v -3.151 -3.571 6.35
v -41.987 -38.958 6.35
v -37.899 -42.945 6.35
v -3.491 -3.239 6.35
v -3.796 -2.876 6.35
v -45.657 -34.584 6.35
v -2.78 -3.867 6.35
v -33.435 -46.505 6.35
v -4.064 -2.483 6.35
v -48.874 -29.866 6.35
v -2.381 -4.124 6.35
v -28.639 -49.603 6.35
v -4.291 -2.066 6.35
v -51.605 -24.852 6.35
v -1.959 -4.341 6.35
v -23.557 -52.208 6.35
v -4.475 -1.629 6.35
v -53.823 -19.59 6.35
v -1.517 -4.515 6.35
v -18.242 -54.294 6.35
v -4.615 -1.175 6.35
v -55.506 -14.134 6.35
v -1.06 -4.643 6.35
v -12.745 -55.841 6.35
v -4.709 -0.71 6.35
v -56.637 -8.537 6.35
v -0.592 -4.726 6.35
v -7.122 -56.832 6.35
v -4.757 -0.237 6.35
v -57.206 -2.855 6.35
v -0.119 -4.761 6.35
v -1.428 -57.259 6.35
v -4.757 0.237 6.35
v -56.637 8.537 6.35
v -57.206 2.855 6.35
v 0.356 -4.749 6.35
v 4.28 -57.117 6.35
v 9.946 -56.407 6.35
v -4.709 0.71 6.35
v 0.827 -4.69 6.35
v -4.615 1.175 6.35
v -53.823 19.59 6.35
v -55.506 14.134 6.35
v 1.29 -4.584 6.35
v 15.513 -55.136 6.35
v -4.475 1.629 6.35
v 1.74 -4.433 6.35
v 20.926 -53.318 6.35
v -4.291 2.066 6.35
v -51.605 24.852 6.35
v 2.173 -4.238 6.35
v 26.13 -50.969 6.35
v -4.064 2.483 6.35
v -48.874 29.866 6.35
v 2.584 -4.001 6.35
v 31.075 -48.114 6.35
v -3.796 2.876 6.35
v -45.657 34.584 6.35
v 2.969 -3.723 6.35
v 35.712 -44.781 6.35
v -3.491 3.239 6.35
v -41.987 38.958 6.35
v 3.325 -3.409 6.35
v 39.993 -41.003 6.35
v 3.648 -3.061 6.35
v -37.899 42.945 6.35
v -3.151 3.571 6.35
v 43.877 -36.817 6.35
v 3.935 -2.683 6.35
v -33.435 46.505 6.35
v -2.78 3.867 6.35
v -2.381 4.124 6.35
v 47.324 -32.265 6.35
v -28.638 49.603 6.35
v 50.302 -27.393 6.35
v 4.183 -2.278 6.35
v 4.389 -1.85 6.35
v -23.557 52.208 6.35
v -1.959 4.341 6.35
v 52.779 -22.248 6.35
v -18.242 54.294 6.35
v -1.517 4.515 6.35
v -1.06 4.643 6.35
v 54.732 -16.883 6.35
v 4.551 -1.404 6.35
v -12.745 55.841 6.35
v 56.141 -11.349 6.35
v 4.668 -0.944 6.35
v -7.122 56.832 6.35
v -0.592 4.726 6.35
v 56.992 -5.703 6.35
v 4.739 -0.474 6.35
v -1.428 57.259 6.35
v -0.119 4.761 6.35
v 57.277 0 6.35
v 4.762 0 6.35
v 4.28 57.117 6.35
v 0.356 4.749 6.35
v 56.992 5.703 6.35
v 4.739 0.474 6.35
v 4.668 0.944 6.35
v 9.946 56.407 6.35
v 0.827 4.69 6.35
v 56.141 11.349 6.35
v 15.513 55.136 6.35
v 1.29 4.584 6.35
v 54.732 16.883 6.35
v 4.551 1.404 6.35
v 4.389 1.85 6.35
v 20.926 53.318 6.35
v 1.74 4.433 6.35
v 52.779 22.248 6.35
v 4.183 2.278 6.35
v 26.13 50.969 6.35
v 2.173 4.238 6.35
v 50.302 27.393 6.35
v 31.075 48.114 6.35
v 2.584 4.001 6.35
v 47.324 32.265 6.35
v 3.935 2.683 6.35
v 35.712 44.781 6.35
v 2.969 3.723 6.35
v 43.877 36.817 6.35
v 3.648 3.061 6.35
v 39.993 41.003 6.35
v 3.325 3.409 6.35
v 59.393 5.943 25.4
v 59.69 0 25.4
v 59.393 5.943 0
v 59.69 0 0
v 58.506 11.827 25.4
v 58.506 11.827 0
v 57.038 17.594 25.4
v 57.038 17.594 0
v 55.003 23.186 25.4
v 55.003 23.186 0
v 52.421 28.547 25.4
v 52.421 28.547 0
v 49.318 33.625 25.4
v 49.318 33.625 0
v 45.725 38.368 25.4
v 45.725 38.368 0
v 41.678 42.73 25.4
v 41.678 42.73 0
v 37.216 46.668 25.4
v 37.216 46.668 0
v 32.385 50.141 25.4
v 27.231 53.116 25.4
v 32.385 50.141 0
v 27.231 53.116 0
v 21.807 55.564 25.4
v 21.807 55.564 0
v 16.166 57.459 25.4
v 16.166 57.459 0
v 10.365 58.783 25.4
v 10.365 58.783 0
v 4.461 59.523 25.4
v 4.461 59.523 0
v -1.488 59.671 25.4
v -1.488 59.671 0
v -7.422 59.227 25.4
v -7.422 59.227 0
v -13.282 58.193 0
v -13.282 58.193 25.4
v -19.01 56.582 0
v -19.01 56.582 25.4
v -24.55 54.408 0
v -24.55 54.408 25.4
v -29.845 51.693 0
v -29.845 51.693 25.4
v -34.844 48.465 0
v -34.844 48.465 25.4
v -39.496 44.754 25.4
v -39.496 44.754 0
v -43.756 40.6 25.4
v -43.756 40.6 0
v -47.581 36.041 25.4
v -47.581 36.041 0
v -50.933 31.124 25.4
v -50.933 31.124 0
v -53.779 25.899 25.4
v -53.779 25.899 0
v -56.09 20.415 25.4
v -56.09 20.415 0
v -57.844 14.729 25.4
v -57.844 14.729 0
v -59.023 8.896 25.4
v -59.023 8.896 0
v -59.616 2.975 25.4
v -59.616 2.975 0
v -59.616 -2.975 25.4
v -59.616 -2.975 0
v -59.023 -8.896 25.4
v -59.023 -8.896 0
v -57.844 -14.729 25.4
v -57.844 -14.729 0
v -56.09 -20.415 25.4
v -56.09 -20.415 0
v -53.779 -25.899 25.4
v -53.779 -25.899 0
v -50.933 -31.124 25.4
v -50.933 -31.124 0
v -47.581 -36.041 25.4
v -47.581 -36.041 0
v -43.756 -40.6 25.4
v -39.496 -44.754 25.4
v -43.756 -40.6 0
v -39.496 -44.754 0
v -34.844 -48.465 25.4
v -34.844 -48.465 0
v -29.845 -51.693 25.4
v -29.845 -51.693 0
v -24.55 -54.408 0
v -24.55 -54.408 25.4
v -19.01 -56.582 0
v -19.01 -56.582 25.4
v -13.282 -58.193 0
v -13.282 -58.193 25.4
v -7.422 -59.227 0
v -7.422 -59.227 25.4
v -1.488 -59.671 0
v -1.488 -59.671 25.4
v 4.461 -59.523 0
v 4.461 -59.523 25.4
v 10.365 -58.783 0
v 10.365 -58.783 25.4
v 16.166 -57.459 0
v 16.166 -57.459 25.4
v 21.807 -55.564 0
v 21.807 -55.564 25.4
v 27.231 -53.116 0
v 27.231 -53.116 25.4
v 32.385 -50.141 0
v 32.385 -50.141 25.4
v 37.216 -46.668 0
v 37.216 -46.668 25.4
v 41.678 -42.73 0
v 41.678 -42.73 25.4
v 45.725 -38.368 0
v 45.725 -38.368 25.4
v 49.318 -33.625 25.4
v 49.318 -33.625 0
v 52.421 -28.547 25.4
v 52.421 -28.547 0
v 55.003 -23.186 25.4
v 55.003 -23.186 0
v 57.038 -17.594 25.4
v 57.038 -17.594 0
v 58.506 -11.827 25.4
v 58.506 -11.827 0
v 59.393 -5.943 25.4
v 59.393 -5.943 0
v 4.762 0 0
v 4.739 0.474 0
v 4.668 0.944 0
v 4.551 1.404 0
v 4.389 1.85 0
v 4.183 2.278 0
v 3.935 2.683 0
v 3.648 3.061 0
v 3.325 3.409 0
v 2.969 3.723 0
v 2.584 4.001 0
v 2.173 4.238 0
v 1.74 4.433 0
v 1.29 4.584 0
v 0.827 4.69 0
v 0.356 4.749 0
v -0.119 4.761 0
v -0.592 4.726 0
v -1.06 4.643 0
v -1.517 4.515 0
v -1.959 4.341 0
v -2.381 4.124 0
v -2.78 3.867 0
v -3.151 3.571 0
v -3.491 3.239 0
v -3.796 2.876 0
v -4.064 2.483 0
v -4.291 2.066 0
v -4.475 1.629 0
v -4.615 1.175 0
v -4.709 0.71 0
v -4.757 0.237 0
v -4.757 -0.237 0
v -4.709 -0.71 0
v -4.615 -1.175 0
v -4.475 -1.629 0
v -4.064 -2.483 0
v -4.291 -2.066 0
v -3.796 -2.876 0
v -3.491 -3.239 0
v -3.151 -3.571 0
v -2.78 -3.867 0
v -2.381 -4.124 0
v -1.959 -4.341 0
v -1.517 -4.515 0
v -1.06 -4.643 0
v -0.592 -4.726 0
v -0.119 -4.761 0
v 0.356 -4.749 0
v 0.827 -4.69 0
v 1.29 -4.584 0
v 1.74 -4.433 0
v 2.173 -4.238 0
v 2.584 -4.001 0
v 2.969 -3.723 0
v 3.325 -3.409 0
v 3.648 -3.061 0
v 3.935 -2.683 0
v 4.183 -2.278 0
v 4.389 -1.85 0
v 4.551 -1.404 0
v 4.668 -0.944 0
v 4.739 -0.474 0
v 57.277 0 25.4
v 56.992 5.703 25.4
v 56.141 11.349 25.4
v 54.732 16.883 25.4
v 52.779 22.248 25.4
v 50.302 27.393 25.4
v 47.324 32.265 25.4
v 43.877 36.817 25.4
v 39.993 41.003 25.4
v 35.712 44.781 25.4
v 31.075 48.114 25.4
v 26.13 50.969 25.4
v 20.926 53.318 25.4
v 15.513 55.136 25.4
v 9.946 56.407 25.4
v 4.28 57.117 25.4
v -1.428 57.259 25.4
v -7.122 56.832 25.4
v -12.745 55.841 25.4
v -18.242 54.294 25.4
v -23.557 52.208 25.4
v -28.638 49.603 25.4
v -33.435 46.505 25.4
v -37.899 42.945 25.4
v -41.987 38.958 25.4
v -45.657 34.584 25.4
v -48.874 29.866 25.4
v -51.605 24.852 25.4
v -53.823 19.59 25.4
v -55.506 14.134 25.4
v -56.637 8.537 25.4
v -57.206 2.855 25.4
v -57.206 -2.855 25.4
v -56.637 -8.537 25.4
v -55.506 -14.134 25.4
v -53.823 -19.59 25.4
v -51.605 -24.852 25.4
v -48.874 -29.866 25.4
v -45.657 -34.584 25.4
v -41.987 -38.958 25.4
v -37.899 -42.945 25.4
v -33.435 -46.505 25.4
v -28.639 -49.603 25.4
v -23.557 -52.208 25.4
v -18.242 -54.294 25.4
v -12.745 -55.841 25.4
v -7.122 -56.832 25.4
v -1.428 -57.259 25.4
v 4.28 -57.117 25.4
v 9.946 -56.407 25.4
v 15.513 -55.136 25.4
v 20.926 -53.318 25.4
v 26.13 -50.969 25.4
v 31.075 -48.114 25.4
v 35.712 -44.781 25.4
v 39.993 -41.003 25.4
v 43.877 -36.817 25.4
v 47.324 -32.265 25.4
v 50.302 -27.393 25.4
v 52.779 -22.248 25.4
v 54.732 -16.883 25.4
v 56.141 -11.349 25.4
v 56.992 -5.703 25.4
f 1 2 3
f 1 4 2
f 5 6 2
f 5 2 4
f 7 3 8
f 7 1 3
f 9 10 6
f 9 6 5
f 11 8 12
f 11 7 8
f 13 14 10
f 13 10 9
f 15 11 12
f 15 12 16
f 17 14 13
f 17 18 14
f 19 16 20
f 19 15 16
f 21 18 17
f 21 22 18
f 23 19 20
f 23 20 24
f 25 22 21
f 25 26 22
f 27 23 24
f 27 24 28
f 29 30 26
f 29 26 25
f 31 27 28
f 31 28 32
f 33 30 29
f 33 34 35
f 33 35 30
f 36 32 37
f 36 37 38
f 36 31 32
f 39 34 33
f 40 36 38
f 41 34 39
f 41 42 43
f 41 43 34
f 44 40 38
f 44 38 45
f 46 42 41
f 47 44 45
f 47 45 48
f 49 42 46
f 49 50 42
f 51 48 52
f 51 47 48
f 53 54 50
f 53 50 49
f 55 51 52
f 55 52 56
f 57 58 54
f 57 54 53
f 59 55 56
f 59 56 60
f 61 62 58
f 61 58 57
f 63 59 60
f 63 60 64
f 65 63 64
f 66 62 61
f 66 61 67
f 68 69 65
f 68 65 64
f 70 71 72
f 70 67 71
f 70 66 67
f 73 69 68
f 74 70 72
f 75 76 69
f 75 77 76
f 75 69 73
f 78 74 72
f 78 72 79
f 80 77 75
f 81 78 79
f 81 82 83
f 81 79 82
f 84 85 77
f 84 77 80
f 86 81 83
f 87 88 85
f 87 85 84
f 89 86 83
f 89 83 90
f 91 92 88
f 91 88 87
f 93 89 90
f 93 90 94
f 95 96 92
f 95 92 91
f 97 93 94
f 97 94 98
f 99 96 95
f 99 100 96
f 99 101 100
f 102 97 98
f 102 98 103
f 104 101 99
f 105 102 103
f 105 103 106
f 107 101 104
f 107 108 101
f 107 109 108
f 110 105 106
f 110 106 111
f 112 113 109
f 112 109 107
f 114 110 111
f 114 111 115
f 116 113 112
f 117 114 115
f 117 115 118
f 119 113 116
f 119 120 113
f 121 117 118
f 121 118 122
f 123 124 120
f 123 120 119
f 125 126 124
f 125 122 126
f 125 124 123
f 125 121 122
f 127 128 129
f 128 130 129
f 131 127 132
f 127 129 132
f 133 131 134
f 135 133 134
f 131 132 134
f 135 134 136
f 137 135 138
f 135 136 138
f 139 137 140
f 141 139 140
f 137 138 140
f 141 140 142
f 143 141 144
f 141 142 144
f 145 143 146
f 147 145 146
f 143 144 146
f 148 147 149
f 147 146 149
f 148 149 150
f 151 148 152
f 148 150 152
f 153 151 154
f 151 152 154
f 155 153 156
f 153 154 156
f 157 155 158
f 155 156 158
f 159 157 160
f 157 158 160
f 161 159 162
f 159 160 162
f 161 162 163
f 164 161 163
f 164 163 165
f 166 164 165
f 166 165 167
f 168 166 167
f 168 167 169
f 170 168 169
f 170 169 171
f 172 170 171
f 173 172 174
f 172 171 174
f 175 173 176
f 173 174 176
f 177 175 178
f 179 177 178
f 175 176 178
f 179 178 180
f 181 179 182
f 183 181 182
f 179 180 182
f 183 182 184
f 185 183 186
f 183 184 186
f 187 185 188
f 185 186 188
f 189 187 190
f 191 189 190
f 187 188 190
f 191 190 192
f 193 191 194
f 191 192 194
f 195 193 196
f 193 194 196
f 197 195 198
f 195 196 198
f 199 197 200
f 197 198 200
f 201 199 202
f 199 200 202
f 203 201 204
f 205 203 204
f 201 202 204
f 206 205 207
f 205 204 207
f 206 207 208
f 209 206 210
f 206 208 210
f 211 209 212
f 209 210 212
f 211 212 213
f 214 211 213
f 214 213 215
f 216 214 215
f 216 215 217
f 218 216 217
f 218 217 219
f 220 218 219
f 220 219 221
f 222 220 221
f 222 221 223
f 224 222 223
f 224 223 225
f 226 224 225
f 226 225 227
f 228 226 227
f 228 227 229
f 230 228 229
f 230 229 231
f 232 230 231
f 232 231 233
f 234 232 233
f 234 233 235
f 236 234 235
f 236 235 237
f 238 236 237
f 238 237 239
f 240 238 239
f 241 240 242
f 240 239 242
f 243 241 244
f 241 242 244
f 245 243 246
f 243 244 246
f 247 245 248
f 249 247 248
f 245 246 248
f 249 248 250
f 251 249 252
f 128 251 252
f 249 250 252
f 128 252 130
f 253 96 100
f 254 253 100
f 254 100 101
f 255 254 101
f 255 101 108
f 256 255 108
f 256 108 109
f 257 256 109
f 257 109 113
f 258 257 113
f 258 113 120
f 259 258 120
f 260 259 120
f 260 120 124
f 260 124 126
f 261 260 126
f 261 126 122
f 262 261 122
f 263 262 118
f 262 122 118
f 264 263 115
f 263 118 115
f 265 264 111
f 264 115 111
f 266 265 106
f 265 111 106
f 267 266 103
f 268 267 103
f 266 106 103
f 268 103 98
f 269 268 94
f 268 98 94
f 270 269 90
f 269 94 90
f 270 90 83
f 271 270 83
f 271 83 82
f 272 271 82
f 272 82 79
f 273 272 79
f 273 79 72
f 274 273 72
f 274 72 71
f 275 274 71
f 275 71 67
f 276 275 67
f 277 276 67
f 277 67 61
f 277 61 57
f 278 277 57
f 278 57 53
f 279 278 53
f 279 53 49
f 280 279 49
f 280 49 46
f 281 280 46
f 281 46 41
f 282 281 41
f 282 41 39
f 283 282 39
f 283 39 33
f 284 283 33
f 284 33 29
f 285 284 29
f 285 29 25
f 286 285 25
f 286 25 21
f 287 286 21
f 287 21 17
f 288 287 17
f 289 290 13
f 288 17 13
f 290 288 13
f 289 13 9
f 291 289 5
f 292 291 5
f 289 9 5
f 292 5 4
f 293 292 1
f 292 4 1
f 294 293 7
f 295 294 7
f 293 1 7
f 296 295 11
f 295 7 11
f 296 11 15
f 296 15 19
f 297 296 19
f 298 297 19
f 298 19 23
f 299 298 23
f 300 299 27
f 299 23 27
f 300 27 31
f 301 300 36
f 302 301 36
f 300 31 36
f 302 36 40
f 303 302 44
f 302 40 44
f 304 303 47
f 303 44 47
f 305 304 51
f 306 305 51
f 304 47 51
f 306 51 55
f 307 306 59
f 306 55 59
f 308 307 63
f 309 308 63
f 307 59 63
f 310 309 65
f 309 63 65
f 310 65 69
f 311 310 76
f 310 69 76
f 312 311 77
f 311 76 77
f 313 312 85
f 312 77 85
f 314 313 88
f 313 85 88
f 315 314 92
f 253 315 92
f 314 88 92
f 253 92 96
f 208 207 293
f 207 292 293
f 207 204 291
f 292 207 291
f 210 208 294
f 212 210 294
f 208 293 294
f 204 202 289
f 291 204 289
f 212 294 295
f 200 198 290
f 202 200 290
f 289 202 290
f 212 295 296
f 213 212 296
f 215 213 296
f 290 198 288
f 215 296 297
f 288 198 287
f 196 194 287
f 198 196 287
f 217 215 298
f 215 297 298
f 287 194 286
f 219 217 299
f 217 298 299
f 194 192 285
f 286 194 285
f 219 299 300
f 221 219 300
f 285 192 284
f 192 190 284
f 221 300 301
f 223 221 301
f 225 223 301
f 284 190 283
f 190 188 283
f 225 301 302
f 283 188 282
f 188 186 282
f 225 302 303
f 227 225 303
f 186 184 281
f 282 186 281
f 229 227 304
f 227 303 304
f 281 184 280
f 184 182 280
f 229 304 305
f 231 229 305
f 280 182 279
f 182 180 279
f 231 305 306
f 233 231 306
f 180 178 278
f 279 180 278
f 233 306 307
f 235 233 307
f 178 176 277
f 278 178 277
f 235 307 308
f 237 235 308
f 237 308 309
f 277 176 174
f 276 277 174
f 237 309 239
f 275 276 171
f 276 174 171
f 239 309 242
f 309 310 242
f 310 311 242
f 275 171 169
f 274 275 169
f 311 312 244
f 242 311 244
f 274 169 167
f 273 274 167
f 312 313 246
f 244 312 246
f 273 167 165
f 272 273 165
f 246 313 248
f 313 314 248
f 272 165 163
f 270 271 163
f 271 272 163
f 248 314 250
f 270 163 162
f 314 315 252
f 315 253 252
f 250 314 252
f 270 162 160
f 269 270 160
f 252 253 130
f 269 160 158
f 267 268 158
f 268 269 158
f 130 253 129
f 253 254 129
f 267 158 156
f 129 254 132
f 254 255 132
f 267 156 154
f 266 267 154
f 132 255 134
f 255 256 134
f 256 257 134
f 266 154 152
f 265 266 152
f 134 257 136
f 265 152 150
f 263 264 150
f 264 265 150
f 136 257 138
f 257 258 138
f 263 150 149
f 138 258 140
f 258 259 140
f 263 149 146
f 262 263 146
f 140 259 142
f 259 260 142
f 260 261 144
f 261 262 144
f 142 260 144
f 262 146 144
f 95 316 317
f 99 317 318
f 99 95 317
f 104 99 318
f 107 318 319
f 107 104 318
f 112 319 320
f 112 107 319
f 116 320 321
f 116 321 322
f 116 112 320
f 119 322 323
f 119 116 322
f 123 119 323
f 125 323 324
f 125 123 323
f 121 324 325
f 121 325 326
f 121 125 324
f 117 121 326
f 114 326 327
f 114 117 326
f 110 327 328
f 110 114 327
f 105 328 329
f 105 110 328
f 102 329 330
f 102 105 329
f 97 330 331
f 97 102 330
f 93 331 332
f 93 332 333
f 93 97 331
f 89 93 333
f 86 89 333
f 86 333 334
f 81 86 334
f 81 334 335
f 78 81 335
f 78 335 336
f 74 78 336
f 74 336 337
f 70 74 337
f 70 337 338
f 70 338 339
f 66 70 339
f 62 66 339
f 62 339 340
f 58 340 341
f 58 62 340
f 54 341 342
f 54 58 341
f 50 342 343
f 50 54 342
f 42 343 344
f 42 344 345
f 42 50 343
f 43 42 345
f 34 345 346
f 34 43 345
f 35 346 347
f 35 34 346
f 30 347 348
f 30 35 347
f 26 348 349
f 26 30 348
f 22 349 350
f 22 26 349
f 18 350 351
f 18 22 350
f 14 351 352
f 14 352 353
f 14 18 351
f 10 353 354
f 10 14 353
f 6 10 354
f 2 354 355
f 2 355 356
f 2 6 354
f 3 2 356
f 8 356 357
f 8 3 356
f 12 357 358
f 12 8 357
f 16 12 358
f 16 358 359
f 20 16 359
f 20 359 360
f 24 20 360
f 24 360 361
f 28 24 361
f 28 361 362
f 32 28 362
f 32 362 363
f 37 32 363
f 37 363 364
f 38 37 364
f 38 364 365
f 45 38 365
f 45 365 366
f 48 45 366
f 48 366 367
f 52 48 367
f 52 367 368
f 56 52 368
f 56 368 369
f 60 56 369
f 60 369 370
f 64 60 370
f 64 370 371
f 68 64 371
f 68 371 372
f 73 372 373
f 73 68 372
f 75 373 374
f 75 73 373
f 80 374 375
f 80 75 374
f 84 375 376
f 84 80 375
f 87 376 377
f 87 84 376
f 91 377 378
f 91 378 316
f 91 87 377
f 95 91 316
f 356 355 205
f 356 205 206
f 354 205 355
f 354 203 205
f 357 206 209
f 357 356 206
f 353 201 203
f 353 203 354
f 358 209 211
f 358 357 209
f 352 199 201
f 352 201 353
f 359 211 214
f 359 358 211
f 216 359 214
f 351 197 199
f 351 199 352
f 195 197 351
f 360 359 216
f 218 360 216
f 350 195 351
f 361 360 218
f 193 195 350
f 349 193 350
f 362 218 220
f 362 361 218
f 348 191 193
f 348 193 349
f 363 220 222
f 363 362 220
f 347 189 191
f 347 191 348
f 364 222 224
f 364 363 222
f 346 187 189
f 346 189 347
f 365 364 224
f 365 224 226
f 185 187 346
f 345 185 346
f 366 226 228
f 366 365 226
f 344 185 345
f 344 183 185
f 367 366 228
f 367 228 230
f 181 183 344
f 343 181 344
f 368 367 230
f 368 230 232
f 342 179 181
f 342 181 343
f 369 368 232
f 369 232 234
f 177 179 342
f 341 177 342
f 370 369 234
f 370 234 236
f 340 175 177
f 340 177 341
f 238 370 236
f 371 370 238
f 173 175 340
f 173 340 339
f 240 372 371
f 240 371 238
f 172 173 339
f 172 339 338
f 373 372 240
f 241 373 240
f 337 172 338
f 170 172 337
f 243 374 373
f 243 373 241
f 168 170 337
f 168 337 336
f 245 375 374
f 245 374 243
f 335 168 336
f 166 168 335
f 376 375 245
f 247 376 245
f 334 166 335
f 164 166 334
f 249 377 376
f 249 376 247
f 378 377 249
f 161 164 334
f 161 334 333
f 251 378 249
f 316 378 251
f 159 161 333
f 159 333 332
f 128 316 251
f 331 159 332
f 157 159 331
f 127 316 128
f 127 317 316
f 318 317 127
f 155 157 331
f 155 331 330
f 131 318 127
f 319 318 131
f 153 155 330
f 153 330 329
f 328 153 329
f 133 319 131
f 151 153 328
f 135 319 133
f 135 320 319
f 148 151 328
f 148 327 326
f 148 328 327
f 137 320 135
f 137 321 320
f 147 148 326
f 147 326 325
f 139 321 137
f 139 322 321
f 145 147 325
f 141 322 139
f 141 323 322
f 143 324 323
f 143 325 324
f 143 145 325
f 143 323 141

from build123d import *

# Parameters (mm, degrees)
F0_R     = 59.69
F1_DEPTH = 6.35
F2_R     = 59.69
F2_R_2   = 57.277
F3_DEPTH = 19.05
F4_R     = 4.7625
F5_DEPTH = 25.4


# Not quite as in the source:
# - a feature names something its author has since deleted; it is built from what else it names


with BuildPart() as f1:
    # F0 (on Top) → F1 (new body)
    with BuildSketch(Plane.XY):
        Circle(F0_R)
    extrude(amount=F1_DEPTH)

    # F2 (on face) → F3 (join)
    with BuildSketch(Plane.XY.offset(6.35)):
        Circle(F2_R)
        Circle(F2_R_2, mode=Mode.SUBTRACT)
    extrude(amount=F3_DEPTH)

    # F4 (on face) → F5 (cut)
    with BuildSketch(Plane.XY.offset(6.35)):
        Circle(F4_R)
    extrude(amount=-F5_DEPTH, mode=Mode.SUBTRACT)


solid = f1.part
